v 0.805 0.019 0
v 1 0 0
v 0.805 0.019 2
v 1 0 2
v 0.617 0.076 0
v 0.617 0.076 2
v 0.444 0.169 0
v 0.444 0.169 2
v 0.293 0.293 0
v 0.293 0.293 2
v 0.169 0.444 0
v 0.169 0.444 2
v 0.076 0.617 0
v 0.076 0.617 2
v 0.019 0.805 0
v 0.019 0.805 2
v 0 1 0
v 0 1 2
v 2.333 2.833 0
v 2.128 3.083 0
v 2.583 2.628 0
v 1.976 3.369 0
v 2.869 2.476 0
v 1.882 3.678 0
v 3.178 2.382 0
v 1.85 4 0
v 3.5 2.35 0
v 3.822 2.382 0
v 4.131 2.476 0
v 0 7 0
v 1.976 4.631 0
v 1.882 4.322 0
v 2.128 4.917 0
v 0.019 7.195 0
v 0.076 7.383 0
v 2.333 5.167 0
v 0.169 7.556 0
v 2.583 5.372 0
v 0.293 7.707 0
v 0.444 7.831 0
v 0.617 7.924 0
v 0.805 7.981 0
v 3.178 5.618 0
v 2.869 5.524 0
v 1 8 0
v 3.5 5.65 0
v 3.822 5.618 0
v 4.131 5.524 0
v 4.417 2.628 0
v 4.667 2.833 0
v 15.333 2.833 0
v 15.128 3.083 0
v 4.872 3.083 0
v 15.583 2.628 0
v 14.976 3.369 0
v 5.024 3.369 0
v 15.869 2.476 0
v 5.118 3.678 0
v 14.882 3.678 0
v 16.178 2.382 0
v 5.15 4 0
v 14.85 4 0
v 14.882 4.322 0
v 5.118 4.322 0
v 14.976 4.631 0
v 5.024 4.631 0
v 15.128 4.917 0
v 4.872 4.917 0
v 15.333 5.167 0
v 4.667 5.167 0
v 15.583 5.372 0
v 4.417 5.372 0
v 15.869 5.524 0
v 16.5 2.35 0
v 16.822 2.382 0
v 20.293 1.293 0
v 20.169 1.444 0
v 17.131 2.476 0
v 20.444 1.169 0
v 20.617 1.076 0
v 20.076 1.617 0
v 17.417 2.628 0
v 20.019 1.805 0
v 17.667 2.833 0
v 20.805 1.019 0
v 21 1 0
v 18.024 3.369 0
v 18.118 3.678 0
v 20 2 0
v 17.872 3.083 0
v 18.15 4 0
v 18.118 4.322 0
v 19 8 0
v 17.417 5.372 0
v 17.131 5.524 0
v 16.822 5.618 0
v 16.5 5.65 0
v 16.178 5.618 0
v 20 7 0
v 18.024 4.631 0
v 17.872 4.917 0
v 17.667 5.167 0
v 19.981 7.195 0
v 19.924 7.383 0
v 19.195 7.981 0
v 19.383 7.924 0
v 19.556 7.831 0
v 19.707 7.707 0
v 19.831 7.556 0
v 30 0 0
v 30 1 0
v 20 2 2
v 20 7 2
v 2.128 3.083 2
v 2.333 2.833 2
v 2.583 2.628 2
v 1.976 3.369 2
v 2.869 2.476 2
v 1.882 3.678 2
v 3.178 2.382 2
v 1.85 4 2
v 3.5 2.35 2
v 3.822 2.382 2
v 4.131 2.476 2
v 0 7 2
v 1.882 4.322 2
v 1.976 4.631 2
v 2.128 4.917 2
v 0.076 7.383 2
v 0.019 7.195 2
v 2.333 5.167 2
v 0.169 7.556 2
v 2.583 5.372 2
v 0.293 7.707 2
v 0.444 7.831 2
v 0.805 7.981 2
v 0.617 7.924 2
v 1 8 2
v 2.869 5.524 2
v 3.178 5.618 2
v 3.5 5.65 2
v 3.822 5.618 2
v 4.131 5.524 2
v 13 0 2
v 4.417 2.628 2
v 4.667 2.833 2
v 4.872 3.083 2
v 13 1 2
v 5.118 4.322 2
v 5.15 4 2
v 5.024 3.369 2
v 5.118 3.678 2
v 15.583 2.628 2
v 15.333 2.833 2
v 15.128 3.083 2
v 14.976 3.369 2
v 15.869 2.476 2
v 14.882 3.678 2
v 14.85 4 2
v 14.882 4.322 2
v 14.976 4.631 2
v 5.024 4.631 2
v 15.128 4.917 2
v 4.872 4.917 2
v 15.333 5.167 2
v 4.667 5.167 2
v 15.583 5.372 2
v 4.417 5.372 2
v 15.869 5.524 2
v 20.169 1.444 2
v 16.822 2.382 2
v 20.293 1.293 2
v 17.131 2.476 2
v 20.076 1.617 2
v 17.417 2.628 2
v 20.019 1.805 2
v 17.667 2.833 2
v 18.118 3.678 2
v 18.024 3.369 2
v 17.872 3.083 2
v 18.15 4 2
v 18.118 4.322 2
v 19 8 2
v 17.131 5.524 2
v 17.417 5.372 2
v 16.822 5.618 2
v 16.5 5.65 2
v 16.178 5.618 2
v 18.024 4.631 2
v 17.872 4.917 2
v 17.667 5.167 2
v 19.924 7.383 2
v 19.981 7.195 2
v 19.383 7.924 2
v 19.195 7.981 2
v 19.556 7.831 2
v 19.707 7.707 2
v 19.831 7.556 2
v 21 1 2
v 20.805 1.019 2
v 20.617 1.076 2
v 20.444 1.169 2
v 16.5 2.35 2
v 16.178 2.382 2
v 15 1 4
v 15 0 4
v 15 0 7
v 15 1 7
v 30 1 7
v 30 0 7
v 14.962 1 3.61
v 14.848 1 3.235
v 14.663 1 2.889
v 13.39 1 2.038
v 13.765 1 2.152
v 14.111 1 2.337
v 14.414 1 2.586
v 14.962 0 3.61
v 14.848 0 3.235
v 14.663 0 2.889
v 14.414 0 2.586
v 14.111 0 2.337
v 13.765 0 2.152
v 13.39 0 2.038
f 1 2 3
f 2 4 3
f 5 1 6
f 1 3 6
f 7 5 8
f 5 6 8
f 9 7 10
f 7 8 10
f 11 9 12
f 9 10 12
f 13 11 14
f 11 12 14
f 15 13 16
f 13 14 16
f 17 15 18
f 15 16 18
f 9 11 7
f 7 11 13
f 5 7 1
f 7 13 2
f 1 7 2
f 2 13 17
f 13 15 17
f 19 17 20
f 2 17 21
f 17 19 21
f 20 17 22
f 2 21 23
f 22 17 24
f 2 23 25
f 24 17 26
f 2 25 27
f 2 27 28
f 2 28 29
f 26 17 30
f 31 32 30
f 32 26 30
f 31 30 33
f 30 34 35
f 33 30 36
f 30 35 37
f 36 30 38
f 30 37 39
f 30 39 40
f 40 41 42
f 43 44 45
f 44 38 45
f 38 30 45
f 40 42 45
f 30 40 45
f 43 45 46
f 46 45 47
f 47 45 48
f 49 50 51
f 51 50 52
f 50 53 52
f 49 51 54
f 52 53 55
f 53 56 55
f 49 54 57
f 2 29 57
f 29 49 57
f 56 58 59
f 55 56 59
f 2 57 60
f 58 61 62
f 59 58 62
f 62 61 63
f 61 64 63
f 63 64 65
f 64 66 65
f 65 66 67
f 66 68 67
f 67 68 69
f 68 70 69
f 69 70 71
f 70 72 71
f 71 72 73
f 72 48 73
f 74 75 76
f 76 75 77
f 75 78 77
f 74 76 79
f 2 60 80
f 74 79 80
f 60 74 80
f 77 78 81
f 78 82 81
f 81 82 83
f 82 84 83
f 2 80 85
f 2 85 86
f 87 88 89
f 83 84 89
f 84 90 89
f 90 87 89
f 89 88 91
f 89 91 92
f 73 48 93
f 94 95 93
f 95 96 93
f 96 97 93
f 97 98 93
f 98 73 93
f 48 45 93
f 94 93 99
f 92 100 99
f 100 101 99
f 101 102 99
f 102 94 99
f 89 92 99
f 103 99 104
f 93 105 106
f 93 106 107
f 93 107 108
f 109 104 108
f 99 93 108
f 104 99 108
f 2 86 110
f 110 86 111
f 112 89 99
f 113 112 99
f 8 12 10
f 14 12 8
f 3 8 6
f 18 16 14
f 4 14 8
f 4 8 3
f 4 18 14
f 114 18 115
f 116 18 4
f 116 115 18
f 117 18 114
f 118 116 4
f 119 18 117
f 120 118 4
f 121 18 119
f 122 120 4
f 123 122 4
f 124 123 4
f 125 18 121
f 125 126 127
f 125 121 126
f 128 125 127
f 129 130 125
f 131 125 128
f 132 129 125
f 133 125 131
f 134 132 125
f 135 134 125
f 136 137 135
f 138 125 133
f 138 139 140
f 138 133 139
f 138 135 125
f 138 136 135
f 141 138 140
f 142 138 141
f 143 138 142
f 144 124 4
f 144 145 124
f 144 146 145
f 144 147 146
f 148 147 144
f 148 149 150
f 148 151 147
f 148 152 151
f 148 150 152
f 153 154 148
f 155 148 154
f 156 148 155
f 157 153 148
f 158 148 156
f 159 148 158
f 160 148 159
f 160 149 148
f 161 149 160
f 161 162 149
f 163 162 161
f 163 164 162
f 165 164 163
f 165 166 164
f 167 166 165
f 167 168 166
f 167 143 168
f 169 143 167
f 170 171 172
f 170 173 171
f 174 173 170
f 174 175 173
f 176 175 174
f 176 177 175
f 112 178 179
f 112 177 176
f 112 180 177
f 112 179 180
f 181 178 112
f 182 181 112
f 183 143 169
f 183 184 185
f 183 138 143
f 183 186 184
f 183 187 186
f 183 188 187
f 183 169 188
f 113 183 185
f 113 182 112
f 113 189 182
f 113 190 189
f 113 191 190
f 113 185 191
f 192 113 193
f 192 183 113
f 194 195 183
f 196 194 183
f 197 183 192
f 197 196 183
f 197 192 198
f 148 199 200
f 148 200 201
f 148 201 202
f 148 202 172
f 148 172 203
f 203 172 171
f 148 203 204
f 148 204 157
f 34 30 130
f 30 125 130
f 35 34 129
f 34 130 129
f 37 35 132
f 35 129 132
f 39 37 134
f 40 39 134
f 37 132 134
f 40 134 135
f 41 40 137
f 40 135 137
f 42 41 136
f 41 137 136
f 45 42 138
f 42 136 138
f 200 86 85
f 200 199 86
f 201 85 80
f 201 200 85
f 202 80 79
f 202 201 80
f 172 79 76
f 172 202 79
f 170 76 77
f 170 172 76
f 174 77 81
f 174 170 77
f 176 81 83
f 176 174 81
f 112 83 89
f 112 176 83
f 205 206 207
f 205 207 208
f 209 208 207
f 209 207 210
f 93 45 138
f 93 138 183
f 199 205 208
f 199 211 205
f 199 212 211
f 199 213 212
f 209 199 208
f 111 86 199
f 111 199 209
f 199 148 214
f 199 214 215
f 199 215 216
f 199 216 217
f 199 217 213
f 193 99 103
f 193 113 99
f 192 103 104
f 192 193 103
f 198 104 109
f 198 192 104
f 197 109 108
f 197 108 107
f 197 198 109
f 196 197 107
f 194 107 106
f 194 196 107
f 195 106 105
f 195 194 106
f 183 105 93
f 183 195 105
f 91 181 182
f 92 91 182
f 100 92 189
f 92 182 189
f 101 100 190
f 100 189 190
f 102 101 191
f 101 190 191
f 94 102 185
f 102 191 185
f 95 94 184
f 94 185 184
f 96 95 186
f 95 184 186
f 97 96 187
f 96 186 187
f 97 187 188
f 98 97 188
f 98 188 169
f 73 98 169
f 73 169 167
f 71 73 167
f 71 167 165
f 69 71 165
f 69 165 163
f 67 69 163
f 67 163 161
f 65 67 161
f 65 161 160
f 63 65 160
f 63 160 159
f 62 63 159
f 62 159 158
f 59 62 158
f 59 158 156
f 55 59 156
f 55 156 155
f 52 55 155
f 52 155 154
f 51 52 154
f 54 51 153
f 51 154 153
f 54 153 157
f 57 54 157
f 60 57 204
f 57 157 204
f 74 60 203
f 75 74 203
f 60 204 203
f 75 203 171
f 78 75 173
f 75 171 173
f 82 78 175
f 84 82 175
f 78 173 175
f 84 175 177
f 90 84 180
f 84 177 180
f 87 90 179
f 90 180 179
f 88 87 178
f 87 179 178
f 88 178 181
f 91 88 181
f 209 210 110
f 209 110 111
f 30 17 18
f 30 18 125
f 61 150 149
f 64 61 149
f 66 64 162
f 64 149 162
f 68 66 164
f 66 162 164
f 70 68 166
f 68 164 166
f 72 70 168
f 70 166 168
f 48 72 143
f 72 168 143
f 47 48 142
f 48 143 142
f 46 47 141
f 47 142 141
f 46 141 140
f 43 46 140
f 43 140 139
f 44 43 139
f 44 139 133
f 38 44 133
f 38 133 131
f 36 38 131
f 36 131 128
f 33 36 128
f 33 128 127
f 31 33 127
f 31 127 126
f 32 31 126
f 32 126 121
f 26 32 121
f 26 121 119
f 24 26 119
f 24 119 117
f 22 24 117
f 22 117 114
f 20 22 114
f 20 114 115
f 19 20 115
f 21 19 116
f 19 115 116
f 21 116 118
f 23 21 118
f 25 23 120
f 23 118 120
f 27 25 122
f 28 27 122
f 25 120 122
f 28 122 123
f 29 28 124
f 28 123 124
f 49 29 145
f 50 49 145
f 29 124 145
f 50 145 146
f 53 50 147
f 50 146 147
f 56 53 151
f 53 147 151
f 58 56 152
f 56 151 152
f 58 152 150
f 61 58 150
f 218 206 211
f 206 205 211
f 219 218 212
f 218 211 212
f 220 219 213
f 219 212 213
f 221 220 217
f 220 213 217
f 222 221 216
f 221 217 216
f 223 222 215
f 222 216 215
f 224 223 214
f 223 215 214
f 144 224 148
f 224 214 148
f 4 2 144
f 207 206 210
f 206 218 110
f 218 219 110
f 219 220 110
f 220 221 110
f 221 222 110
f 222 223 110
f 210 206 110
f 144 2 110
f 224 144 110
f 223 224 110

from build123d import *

# Parameters (mm, degrees)
SKETCH1_W                = 20
SKETCH1_H                = 8
BOSS_EXTRUDE1_DEPTH      = 2
SKETCH2_W                = 15
SKETCH2_H                = 1
BOSS_EXTRUDE2_DEPTH      = 5
BOSS_EXTRUDE2_DEPTH_BACK = 2
SKETCH3_R                = 1.65
CUT_EXTRUDE1_DEPTH       = 3
FILLET1_R                = 1
FILLET2_R                = 2


with BuildPart() as part:
    # Sketch1 → Boss-Extrude1 (new body)
    with BuildSketch(Plane.XY):
        with Locations((10, 4)):
            Rectangle(SKETCH1_W, SKETCH1_H)
    extrude(amount=BOSS_EXTRUDE1_DEPTH)

    # Sketch2 → Boss-Extrude2 (add, two sides)
    with BuildSketch(Plane.XY.offset(2)) as boss_extrude2_sk:
        with Locations((22.5, 0.5)):
            Rectangle(SKETCH2_W, SKETCH2_H)
    extrude(amount=BOSS_EXTRUDE2_DEPTH)
    extrude(boss_extrude2_sk.sketch, amount=-BOSS_EXTRUDE2_DEPTH_BACK)

    # Sketch3 → Cut-Extrude1 (cut, through all)
    with BuildSketch(Plane.XY.offset(2)):
        with Locations((3.5, 4)):
            Circle(SKETCH3_R)
        with Locations((16.5, 4)):
            Circle(SKETCH3_R)
    extrude(amount=-CUT_EXTRUDE1_DEPTH, mode=Mode.SUBTRACT)

    # Fillet1
    fillet1_edges = [part.edges().sort_by_distance(p)[0] for p in [
        (20, 1, 1),
        (0, 8, 1),
        (20, 8, 1),
        (0, 0, 1),
    ]]
    fillet(fillet1_edges, radius=FILLET1_R)

    # Fillet2
    fillet2_edges = [part.edges().sort_by_distance(p)[0] for p in [
        (15, 0.5, 2),
    ]]
    fillet(fillet2_edges, radius=FILLET2_R)


solid = part.part
